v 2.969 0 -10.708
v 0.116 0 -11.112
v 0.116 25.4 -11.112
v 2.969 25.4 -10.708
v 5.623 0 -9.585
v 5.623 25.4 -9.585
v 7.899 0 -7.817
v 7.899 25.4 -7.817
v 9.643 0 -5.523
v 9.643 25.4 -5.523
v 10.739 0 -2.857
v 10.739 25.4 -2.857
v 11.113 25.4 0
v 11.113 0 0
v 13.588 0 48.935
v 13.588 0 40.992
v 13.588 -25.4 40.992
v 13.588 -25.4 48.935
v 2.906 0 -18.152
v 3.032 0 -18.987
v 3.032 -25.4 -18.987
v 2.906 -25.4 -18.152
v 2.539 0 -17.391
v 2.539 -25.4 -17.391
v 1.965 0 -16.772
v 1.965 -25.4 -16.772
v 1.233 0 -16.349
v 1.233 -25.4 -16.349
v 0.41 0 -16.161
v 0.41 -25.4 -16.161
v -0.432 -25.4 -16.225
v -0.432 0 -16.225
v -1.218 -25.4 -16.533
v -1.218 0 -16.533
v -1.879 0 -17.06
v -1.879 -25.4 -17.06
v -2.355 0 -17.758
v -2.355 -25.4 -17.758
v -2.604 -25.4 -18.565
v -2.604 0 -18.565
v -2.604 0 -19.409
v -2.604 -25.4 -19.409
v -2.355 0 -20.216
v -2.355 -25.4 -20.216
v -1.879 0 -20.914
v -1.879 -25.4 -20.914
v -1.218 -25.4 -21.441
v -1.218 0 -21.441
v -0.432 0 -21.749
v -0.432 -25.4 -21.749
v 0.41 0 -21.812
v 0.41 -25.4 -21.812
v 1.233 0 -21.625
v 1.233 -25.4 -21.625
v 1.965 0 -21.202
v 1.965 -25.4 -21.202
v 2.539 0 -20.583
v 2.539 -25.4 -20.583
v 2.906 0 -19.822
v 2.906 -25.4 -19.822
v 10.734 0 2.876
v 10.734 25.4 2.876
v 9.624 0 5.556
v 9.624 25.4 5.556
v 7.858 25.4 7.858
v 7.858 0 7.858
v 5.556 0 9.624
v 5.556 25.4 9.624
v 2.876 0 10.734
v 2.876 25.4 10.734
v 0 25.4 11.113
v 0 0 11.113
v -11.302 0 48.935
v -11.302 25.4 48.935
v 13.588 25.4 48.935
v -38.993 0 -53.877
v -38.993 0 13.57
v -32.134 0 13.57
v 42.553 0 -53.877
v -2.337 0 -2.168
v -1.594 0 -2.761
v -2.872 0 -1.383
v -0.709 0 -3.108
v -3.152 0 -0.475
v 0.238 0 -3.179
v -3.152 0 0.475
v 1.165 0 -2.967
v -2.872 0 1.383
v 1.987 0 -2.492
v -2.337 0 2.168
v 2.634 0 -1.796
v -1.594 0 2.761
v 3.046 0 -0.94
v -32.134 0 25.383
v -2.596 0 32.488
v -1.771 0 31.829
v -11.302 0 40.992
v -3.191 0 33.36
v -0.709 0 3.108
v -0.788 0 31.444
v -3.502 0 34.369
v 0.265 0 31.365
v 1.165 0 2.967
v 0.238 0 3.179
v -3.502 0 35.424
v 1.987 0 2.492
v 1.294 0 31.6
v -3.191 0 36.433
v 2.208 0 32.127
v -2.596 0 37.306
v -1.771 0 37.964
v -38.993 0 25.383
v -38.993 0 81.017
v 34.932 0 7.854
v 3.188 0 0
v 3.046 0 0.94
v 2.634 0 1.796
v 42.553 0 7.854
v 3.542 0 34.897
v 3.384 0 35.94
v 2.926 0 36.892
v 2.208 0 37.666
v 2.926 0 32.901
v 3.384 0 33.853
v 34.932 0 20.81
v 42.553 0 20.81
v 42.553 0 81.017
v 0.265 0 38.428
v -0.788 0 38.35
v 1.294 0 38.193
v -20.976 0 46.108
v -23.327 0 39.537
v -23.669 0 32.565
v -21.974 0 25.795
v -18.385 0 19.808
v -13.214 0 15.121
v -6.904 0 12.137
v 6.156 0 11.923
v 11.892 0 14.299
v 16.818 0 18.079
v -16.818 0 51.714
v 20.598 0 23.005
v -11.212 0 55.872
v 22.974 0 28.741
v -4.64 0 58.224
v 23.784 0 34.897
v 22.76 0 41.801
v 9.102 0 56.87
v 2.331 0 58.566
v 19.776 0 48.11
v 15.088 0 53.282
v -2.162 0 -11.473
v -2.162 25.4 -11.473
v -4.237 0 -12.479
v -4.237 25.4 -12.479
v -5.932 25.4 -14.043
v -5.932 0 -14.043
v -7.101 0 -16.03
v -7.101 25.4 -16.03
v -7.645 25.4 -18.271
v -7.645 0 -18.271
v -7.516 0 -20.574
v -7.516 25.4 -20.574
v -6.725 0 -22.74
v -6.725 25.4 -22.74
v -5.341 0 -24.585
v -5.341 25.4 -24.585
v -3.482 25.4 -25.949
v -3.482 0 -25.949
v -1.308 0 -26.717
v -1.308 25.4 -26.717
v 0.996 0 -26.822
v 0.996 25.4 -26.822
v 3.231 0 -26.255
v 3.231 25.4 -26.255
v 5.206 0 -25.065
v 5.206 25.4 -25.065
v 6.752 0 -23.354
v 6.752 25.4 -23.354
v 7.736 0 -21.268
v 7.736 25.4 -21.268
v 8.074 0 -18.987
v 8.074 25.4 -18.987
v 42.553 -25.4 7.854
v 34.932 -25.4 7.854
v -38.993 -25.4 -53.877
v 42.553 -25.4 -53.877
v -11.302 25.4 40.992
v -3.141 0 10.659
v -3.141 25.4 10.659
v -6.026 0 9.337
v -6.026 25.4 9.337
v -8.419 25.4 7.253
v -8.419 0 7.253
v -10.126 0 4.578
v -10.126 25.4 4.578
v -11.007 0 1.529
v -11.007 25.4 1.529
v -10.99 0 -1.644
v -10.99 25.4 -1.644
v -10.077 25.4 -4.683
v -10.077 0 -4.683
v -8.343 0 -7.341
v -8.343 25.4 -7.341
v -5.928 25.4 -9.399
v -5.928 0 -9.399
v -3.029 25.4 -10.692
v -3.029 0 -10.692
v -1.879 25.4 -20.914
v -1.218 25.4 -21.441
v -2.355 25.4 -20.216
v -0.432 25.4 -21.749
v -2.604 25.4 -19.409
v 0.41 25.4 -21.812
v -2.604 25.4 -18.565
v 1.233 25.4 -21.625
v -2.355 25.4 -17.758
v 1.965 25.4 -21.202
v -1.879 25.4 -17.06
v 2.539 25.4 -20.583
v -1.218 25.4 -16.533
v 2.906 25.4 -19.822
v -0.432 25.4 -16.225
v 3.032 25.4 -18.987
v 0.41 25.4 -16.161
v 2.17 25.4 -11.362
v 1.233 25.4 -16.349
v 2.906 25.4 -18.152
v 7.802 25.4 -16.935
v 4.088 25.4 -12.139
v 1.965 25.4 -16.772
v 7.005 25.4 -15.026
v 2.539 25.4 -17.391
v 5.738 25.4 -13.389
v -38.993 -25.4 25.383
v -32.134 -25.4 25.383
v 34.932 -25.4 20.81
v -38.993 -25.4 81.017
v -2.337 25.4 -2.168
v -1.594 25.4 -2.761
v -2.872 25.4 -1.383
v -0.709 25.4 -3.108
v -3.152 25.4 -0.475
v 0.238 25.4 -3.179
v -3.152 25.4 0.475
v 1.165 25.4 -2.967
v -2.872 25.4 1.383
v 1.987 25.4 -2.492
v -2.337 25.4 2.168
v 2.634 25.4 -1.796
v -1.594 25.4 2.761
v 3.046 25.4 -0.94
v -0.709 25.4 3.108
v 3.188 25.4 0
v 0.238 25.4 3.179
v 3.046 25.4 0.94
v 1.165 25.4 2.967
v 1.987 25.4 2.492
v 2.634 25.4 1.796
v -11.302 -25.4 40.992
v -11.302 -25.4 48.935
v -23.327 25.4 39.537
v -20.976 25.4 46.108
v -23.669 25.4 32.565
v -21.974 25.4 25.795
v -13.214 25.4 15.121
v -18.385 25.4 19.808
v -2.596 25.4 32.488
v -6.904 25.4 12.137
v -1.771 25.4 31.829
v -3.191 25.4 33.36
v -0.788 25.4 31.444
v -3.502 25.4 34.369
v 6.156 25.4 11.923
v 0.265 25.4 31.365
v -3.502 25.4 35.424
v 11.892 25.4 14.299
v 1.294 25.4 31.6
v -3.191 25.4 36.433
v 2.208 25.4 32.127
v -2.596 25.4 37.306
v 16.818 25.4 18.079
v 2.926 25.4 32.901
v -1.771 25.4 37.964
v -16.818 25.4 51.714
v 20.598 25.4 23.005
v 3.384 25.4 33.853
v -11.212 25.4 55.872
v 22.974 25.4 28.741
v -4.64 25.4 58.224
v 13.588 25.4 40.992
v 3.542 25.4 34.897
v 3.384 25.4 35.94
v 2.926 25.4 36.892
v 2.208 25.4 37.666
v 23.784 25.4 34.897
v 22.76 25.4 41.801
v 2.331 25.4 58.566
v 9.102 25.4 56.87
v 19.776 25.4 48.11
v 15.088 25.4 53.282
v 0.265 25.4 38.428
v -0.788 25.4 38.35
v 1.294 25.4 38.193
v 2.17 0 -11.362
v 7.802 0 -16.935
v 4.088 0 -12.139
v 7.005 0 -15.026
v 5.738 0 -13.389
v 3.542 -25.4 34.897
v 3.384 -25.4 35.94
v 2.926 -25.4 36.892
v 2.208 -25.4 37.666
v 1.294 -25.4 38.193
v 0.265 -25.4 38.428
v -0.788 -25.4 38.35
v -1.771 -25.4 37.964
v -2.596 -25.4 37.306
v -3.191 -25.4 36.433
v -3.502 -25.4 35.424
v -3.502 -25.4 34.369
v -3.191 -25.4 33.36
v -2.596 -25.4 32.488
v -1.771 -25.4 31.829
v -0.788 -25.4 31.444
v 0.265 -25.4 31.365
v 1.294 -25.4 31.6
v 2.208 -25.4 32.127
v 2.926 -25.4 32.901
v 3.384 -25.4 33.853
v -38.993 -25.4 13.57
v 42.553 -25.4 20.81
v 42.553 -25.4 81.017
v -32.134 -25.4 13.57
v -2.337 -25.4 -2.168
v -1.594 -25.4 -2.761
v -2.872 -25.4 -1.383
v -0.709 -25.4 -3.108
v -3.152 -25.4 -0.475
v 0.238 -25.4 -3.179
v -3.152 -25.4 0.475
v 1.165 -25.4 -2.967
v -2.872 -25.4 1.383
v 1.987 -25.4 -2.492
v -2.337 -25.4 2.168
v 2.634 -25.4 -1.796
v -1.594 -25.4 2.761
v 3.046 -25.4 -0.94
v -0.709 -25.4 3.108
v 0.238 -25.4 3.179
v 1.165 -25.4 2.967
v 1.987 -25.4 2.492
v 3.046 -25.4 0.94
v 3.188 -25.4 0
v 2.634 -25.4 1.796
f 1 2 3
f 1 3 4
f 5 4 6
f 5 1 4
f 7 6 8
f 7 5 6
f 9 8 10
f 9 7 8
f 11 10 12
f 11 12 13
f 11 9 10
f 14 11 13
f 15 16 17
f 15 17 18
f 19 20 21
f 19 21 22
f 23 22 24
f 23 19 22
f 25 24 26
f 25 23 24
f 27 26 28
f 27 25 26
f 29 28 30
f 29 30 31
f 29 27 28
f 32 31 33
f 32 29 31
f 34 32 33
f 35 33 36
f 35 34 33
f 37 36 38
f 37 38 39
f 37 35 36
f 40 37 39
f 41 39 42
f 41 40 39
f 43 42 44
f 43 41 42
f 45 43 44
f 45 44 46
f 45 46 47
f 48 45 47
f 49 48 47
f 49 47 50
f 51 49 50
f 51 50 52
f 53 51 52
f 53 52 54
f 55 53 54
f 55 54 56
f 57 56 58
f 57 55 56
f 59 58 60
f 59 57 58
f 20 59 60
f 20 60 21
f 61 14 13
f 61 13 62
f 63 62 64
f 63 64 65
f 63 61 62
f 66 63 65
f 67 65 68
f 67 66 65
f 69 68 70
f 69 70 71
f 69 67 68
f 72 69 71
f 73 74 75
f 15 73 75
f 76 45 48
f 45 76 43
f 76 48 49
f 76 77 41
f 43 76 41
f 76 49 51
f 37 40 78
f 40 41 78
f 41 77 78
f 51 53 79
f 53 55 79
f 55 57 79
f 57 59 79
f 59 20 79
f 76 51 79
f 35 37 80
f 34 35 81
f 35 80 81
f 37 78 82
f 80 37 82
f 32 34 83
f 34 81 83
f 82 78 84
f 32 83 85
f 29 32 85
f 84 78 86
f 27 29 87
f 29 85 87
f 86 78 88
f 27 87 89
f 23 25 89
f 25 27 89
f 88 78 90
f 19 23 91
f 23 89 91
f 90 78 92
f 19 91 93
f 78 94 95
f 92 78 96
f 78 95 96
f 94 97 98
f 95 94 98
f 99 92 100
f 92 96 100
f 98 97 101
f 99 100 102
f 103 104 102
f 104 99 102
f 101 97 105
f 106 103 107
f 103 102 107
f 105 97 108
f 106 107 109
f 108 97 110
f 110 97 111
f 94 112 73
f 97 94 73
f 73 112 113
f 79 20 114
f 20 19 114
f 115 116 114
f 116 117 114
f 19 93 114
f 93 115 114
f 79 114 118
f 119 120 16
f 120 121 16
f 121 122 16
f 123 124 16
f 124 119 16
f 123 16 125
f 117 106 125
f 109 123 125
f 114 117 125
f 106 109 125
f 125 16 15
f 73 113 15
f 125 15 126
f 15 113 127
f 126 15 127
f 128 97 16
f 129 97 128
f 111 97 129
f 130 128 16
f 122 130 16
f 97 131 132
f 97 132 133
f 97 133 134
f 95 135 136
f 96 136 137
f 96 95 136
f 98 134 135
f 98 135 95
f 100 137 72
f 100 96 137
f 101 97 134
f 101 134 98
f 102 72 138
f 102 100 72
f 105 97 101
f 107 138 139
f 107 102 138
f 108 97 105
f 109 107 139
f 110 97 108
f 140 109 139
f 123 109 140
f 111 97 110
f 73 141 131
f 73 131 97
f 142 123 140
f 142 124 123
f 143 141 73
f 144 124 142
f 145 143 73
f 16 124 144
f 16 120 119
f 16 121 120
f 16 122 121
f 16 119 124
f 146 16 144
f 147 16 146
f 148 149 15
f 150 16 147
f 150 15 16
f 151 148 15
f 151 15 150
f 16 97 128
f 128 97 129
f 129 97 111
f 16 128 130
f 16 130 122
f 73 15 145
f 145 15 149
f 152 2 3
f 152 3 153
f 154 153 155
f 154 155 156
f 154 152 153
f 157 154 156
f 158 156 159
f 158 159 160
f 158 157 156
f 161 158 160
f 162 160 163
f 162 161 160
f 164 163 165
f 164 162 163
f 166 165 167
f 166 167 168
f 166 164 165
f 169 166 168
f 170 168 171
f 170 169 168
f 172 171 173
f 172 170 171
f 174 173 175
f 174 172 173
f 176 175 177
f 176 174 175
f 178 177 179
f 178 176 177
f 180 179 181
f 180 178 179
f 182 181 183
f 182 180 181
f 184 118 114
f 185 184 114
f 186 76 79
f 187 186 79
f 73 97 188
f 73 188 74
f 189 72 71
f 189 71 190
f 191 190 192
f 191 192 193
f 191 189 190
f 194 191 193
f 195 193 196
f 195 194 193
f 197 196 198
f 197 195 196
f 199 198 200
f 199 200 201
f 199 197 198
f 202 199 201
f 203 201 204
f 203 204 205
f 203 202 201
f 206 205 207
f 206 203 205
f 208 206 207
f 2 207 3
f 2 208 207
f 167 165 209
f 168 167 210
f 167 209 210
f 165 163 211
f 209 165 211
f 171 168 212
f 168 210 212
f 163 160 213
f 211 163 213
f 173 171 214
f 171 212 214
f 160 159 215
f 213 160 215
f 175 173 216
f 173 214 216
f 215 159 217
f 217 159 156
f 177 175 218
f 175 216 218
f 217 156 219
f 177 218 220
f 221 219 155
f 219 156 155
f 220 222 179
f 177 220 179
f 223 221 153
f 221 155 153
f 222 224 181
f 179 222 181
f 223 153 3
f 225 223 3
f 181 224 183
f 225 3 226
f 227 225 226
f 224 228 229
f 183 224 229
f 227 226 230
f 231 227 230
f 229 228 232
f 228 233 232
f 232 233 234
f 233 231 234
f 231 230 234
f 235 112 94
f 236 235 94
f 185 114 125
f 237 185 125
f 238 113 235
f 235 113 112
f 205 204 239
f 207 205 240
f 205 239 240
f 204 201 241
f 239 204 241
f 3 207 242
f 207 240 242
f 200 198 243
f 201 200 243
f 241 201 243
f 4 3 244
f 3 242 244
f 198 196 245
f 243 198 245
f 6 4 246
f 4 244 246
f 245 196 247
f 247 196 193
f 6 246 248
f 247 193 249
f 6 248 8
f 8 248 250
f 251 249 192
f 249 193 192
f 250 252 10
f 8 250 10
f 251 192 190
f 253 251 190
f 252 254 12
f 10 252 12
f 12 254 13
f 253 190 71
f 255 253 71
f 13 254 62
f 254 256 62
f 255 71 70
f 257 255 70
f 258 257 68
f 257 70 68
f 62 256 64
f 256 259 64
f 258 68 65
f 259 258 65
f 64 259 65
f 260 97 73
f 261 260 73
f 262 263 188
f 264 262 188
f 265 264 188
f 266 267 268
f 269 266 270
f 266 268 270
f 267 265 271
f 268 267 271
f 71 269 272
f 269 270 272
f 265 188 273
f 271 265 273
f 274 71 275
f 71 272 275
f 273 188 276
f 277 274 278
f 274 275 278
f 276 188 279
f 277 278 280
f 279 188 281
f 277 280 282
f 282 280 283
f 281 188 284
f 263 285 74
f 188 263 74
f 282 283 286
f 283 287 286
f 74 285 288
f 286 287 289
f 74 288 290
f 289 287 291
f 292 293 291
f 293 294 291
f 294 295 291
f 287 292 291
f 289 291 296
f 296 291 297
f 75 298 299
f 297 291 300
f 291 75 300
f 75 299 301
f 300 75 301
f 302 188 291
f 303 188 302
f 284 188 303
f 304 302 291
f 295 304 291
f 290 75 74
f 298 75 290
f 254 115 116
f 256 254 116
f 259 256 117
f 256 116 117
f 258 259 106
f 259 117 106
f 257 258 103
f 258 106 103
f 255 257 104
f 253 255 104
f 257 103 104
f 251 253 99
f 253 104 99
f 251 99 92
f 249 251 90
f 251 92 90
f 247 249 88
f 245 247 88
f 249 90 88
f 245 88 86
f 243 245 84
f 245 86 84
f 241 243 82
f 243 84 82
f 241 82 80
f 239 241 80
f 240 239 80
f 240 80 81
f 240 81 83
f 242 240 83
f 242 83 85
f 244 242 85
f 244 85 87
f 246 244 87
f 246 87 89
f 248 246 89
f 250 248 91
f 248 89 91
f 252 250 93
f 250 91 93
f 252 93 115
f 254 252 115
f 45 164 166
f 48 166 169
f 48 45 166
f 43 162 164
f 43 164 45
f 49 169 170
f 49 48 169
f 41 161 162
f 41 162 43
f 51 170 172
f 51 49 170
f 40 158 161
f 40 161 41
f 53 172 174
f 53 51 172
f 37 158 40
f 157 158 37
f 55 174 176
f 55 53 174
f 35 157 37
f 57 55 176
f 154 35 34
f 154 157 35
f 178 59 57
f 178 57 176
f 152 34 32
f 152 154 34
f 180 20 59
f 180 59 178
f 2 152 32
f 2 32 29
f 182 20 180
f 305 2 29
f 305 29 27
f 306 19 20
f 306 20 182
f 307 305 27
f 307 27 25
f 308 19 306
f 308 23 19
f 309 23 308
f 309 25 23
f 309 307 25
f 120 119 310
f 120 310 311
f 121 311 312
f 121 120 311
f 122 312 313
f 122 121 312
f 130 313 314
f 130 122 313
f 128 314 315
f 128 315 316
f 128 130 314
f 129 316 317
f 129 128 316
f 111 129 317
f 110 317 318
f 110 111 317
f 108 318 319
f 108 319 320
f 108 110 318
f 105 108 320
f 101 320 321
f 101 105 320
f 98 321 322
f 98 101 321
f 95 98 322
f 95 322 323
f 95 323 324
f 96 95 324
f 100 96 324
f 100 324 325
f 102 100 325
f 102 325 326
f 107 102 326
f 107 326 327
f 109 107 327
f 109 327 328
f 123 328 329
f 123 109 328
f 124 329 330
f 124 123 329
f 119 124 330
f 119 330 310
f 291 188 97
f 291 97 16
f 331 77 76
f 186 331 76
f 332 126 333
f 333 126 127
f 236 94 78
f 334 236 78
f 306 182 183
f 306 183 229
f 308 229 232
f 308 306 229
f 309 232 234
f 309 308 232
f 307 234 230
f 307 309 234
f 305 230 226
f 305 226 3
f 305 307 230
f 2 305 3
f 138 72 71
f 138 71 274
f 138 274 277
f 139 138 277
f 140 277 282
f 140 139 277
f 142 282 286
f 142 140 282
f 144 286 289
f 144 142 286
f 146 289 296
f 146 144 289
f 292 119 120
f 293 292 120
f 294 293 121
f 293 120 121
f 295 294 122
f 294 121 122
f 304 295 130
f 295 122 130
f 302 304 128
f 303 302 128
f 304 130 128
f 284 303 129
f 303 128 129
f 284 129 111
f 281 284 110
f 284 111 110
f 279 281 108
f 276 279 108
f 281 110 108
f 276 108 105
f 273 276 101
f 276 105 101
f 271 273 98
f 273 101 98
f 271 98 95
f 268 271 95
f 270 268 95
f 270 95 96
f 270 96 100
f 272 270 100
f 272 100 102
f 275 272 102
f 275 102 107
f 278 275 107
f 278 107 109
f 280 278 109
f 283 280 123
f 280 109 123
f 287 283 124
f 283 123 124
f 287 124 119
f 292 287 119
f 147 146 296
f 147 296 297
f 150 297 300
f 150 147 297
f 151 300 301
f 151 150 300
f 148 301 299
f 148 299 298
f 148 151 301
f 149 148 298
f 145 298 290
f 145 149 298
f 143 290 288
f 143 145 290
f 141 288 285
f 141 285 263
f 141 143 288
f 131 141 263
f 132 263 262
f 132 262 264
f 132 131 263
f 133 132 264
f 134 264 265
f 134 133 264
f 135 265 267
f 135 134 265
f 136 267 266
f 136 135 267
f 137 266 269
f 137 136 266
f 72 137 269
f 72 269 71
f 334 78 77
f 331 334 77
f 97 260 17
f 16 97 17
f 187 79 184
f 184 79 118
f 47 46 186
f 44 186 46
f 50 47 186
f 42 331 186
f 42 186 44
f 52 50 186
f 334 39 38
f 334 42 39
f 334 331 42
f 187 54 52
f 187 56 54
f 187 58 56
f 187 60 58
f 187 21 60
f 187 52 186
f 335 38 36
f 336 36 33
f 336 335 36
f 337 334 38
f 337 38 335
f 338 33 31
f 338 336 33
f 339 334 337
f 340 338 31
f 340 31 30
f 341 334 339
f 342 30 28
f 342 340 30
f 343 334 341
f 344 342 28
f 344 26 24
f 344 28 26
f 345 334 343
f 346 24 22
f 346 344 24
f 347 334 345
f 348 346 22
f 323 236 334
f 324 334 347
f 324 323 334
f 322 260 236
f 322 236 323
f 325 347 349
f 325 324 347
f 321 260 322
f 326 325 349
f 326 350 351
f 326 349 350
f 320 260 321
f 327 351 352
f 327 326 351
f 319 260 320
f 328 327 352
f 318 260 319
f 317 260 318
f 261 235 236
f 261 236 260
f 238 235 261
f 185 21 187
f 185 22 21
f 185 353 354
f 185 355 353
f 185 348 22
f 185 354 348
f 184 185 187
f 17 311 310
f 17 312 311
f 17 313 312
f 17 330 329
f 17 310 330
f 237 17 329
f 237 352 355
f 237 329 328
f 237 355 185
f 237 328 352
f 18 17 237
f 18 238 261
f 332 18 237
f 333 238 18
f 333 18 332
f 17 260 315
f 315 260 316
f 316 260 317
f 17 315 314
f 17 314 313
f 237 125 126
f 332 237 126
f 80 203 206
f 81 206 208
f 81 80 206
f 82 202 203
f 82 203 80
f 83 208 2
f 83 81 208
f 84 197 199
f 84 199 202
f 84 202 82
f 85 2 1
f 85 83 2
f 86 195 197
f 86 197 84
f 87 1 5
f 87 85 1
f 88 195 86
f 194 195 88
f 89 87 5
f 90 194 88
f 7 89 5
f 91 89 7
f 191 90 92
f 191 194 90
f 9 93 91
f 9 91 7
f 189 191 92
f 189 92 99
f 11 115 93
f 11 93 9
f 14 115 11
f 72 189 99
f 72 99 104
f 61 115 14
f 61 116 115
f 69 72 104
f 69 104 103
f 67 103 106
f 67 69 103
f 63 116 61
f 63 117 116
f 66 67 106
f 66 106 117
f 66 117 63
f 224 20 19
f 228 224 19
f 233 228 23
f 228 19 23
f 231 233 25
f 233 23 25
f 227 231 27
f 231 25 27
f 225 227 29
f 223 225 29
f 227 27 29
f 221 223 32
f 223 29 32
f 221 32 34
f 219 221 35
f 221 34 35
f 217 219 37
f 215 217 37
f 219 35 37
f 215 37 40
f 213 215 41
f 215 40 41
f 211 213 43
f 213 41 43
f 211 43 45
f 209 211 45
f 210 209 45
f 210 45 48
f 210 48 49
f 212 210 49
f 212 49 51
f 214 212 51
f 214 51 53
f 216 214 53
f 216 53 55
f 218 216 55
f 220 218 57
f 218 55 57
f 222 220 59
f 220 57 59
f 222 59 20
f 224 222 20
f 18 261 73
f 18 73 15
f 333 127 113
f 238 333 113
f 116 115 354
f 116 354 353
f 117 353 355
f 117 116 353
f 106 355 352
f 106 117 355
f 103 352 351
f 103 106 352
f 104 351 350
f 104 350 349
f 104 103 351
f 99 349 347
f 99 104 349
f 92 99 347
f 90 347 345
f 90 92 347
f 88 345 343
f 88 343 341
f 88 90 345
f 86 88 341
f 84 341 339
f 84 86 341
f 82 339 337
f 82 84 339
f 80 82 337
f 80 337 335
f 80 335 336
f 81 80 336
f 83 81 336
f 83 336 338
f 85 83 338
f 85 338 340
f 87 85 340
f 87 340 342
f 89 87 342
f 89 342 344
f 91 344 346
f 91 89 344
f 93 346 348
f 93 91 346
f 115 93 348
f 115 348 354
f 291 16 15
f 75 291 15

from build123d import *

# Parameters (mm, degrees)
F0_R     = 3.541779
F0_W     = 24.890188
F0_H     = 7.943678
F0_R_2   = 3.187601
F0_R_3   = 2.833423
F1_DEPTH = 25.4
F2_DEPTH = 25.4


with BuildPart() as f1:
    # F0 (on Front) → F1 (new body)
    with BuildSketch(Plane.XZ):
        with BuildLine():
            ThreePointArc((0, 11.1125), (16.817843, 18.078679), (23.784022, 34.896522))
            ThreePointArc((23.784022, 34.896522), (-16.817843, 51.714365), (0, 11.1125))
        make_face()
        with Locations((0, 34.896522)):
            Circle(F0_R, mode=Mode.SUBTRACT)
        with Locations((1.142709, 44.963414)):
            Rectangle(F0_W, F0_H, mode=Mode.SUBTRACT)
        with BuildLine():
            ThreePointArc((11.1125, 0), (7.857724, 7.857724), (0, 11.1125))
            ThreePointArc((0, 11.1125), (-11.112349, -0.058006), (0.116011, -11.111894))
            ThreePointArc((0.116011, -11.111894), (7.898634, -7.8166), (11.1125, 0))
        make_face()
        Circle(F0_R_2, mode=Mode.SUBTRACT)
        with BuildLine():
            ThreePointArc((8.073733, -18.986969), (5.737907, -13.389154), (0.116011, -11.111894))
            ThreePointArc((0.116011, -11.111894), (-5.341448, -24.584784), (8.073733, -18.986969))
        make_face()
        with Locations((0.198229, -18.986969)):
            Circle(F0_R_3, mode=Mode.SUBTRACT)
    extrude(amount=-F1_DEPTH)


with BuildPart() as f2:
    # F0 (on Front) → F2 (new body)
    with BuildSketch(Plane.XZ):
        Polygon((42.553123, 81.016712), (-38.992912, 81.016712), (-38.992912, 25.382502), (-32.133896, 25.382502), (-32.133896, 13.569761), (-38.992912, 13.569761), (-38.992912, -53.87719), (42.553123, -53.87719), (42.553123, 7.853919), (34.931999, 7.853919), (34.931999, 20.809829), (42.553123, 20.809829), align=None)
        with BuildLine():
            ThreePointArc((8.073733, -18.986969), (-5.341448, -24.584784), (0.116011, -11.111894))
            ThreePointArc((0.116011, -11.111894), (5.737907, -13.389154), (8.073733, -18.986969))
        make_face(mode=Mode.SUBTRACT)
        with BuildLine():
            ThreePointArc((0.116011, -11.111894), (-11.112349, -0.058006), (0, 11.1125))
            ThreePointArc((0, 11.1125), (7.857724, 7.857724), (11.1125, 0))
            ThreePointArc((11.1125, 0), (7.898634, -7.8166), (0.116011, -11.111894))
        make_face(mode=Mode.SUBTRACT)
        with BuildLine():
            ThreePointArc((0, 11.1125), (-16.817843, 51.714365), (23.784022, 34.896522))
            ThreePointArc((23.784022, 34.896522), (16.817843, 18.078679), (0, 11.1125))
        make_face(mode=Mode.SUBTRACT)
        with BuildLine():
            ThreePointArc((8.073733, -18.986969), (5.737907, -13.389154), (0.116011, -11.111894))
            ThreePointArc((0.116011, -11.111894), (-5.341448, -24.584784), (8.073733, -18.986969))
        make_face()
        with Locations((0.198229, -18.986969)):
            Circle(F0_R_3, mode=Mode.SUBTRACT)
        with BuildLine():
            ThreePointArc((11.1125, 0), (7.857724, 7.857724), (0, 11.1125))
            ThreePointArc((0, 11.1125), (-11.112349, -0.058006), (0.116011, -11.111894))
            ThreePointArc((0.116011, -11.111894), (7.898634, -7.8166), (11.1125, 0))
        make_face()
        Circle(F0_R_2, mode=Mode.SUBTRACT)
        with BuildLine():
            ThreePointArc((0, 11.1125), (16.817843, 18.078679), (23.784022, 34.896522))
            ThreePointArc((23.784022, 34.896522), (-16.817843, 51.714365), (0, 11.1125))
        make_face()
        with Locations((0, 34.896522)):
            Circle(F0_R, mode=Mode.SUBTRACT)
        with Locations((1.142709, 44.963414)):
            Rectangle(F0_W, F0_H, mode=Mode.SUBTRACT)
    extrude(amount=F2_DEPTH)


solid = Compound([f1.part, f2.part])
